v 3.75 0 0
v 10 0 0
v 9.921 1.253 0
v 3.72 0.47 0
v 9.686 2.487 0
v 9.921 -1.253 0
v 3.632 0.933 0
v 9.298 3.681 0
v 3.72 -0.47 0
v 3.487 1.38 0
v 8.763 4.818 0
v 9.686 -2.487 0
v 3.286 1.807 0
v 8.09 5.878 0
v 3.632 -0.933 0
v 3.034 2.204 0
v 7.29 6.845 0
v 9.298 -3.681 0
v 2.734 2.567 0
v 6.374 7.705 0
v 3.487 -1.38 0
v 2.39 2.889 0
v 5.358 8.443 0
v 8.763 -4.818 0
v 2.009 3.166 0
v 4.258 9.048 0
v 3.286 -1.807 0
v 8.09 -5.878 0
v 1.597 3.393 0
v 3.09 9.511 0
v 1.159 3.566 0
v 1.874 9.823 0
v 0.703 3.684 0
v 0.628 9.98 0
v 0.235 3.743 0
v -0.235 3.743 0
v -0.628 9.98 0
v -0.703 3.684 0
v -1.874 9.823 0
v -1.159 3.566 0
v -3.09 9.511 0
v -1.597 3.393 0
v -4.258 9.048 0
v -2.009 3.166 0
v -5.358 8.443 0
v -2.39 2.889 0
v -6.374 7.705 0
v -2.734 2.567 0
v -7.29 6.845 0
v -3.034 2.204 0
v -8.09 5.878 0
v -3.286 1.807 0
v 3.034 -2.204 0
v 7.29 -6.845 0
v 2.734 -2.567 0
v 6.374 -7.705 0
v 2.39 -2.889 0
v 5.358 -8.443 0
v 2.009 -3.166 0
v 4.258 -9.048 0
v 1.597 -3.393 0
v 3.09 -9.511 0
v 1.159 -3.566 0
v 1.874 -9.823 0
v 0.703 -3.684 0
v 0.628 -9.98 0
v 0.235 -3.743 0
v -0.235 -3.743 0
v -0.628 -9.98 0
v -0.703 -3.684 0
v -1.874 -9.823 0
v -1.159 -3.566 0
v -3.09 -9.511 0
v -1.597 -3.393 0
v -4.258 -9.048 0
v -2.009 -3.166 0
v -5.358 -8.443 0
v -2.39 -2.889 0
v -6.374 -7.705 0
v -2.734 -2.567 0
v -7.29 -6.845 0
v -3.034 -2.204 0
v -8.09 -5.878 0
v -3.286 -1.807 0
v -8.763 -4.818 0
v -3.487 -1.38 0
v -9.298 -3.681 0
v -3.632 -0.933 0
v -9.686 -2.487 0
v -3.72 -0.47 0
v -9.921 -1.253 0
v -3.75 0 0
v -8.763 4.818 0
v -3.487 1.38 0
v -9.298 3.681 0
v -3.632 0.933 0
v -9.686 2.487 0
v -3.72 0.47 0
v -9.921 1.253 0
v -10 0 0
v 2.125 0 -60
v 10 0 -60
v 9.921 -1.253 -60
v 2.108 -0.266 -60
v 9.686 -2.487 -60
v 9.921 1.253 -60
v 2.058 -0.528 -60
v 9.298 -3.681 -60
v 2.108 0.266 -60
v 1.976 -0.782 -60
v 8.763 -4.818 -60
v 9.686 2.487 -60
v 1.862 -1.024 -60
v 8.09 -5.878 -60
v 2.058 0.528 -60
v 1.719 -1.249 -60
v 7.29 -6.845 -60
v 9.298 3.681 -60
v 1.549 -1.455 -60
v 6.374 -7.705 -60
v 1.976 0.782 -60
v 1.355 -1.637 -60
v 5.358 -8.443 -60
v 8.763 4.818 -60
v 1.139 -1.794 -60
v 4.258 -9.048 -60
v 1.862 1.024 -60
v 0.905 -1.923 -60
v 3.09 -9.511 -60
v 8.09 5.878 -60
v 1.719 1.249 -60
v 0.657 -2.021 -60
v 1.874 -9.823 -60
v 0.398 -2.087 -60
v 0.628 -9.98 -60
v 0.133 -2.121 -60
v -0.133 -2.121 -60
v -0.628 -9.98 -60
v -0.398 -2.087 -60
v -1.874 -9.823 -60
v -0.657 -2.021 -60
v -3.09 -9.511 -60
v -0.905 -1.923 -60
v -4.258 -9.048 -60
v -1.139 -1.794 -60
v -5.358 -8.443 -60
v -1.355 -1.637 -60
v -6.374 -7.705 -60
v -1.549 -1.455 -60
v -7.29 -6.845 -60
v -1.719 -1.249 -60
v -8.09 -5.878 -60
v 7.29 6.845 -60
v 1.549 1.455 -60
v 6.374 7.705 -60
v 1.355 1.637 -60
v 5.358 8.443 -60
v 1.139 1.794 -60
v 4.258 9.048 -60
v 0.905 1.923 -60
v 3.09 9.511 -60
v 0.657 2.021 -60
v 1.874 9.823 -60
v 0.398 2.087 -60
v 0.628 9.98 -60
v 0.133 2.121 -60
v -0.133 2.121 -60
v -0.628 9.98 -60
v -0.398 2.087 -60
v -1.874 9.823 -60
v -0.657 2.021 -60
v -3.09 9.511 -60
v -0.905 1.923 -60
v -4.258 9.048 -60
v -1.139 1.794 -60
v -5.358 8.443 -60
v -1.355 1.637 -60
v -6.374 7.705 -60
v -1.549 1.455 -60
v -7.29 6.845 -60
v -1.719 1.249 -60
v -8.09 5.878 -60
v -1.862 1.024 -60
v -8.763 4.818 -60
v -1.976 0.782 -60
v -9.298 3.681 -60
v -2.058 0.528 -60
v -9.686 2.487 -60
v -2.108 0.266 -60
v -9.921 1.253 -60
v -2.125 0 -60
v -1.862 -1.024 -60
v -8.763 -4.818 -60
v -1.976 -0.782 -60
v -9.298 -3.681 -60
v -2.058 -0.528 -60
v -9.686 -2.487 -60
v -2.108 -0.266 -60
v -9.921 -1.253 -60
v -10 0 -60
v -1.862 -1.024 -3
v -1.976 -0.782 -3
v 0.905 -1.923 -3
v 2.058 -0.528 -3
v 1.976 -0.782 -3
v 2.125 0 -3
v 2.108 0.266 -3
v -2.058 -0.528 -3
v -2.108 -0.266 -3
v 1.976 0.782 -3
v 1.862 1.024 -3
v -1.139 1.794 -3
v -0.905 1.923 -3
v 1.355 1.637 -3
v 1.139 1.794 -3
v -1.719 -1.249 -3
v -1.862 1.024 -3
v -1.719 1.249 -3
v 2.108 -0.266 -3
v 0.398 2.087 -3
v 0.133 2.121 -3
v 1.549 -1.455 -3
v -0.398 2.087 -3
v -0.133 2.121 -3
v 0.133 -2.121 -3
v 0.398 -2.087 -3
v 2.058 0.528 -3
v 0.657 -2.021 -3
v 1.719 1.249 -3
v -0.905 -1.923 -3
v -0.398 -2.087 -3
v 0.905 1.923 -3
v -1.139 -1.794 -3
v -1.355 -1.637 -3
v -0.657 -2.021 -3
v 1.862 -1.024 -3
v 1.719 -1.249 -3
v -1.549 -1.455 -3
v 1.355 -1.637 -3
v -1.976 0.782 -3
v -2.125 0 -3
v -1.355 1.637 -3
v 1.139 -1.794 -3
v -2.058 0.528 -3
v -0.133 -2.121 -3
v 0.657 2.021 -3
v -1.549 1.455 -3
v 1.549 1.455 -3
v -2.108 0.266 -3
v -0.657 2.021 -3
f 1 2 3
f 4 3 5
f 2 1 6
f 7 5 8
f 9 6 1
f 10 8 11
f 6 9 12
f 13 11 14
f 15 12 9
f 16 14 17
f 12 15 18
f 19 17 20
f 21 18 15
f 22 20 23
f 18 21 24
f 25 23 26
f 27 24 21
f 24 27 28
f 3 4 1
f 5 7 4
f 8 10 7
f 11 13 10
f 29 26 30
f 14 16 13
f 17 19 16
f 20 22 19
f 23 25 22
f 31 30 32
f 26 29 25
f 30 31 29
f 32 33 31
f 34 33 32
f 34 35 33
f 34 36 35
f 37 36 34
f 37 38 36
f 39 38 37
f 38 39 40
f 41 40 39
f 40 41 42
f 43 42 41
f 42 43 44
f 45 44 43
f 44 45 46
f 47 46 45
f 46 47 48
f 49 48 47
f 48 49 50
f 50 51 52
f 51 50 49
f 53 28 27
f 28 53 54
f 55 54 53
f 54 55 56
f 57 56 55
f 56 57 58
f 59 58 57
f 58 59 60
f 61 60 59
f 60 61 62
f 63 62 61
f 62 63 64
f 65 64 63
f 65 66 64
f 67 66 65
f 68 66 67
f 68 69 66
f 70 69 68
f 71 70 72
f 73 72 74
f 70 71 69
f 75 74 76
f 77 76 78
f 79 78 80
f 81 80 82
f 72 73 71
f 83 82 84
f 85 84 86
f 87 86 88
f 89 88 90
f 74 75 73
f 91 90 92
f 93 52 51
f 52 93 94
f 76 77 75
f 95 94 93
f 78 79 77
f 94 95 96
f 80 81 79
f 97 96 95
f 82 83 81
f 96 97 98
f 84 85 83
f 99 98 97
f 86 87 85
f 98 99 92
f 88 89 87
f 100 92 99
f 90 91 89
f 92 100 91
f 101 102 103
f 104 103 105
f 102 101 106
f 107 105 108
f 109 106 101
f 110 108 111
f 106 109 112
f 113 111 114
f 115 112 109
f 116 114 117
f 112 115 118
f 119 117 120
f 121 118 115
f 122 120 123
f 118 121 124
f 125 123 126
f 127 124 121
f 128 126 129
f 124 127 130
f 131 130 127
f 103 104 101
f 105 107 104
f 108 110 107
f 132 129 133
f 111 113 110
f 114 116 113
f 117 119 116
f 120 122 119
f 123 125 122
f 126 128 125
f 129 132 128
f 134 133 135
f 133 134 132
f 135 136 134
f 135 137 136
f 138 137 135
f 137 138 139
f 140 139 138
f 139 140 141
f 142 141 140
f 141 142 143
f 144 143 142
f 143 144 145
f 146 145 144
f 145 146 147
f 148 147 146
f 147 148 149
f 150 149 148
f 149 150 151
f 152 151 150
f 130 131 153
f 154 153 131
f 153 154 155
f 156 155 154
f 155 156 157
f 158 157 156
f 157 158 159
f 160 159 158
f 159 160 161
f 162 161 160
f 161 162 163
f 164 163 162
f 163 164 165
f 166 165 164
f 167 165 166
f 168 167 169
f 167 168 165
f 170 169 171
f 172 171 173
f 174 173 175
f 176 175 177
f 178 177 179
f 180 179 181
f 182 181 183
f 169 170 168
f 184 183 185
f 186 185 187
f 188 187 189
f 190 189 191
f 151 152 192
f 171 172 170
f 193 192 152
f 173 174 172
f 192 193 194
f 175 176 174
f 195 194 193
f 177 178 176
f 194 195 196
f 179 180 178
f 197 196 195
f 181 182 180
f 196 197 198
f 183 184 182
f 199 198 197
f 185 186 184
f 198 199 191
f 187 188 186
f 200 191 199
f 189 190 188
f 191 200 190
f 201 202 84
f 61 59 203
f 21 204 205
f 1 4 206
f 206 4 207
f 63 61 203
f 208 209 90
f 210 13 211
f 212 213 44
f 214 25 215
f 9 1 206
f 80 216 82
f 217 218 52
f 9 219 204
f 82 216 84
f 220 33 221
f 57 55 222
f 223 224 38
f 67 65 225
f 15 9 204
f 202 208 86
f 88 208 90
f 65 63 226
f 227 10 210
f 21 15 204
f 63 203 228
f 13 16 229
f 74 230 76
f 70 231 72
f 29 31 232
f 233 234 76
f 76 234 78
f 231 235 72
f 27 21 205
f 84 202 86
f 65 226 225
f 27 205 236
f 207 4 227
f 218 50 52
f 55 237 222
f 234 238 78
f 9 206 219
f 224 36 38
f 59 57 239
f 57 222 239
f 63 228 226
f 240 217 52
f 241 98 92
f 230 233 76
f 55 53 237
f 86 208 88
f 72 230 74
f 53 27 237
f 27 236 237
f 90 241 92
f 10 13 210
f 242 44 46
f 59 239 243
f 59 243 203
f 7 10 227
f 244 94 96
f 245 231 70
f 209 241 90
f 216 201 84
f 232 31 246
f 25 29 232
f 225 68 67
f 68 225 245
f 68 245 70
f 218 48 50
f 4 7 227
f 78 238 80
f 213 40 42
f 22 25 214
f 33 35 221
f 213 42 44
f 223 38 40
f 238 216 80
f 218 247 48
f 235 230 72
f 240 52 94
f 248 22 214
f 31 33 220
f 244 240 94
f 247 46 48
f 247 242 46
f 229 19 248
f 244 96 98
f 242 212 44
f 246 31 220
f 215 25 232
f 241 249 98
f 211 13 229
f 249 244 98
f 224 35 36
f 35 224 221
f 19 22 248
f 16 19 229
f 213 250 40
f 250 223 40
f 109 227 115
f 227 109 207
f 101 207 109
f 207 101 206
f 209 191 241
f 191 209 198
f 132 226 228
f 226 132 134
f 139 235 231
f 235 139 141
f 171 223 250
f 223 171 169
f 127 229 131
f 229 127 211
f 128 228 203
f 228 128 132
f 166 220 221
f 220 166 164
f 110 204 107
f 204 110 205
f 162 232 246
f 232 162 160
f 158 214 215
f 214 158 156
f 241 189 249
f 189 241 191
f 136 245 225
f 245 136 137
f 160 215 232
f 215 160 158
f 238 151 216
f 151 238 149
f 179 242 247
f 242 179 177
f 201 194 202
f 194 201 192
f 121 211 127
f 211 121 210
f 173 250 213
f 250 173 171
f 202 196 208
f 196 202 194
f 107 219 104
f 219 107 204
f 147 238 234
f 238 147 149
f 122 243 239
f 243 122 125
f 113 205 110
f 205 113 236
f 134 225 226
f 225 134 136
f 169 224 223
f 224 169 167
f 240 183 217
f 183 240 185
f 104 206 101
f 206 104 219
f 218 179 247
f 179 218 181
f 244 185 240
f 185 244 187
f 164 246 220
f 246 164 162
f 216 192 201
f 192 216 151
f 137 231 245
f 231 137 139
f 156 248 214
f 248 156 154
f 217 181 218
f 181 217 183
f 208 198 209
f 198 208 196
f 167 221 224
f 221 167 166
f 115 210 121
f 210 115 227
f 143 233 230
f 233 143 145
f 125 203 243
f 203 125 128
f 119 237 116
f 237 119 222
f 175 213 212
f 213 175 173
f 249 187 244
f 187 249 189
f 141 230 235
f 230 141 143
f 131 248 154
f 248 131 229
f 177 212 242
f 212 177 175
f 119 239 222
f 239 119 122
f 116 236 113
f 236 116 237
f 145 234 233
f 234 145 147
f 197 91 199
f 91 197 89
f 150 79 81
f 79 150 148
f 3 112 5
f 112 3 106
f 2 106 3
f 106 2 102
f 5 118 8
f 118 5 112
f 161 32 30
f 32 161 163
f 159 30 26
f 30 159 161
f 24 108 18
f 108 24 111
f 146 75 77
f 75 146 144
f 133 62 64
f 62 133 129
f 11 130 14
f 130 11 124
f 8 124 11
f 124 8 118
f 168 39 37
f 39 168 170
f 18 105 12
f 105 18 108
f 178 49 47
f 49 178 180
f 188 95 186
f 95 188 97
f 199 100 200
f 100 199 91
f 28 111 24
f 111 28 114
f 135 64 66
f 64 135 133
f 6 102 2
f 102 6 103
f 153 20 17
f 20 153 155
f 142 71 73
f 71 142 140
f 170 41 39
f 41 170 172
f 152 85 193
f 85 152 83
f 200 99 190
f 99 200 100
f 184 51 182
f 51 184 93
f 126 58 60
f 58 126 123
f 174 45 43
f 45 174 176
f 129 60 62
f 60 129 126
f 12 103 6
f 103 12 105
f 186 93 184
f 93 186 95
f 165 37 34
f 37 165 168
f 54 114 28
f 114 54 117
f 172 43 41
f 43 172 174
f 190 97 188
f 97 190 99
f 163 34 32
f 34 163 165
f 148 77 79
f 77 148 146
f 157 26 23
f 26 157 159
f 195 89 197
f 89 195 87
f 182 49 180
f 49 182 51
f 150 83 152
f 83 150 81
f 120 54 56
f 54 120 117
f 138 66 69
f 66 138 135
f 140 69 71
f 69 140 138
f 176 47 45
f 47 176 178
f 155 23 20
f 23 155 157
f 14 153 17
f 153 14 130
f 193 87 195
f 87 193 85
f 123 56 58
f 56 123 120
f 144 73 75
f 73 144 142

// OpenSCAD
$fn = 50;


difference() {
	union() {
		translate(v = [0, 0, -60.0000000000]) {
			cylinder(h = 60, r = 10.0000000000);
		}
		cylinder(h = 0, r = 13.0000000000);
	}
	union() {
		translate(v = [0, 0, 0]) {
			rotate(a = [0, 0, 0]) {
				difference() {
					union() {
						#translate(v = [0, 0, -60.0000000000]) {
							cylinder(h = 60, r = 2.0000000000);
						}
						#translate(v = [0, 0, -3]) {
							cylinder(h = 3, r = 10.0000000000, r1 = 2.1250000000, r2 = 3.7500000000);
						}
						#translate(v = [0, 0, -60.0000000000]) {
							cylinder(h = 60, r = 2.1250000000);
						}
						#translate(v = [0, 0, -60.0000000000]) {
							cylinder(h = 60, r = 2.0000000000);
						}
					}
					union();
				}
			}
		}
	}
}
